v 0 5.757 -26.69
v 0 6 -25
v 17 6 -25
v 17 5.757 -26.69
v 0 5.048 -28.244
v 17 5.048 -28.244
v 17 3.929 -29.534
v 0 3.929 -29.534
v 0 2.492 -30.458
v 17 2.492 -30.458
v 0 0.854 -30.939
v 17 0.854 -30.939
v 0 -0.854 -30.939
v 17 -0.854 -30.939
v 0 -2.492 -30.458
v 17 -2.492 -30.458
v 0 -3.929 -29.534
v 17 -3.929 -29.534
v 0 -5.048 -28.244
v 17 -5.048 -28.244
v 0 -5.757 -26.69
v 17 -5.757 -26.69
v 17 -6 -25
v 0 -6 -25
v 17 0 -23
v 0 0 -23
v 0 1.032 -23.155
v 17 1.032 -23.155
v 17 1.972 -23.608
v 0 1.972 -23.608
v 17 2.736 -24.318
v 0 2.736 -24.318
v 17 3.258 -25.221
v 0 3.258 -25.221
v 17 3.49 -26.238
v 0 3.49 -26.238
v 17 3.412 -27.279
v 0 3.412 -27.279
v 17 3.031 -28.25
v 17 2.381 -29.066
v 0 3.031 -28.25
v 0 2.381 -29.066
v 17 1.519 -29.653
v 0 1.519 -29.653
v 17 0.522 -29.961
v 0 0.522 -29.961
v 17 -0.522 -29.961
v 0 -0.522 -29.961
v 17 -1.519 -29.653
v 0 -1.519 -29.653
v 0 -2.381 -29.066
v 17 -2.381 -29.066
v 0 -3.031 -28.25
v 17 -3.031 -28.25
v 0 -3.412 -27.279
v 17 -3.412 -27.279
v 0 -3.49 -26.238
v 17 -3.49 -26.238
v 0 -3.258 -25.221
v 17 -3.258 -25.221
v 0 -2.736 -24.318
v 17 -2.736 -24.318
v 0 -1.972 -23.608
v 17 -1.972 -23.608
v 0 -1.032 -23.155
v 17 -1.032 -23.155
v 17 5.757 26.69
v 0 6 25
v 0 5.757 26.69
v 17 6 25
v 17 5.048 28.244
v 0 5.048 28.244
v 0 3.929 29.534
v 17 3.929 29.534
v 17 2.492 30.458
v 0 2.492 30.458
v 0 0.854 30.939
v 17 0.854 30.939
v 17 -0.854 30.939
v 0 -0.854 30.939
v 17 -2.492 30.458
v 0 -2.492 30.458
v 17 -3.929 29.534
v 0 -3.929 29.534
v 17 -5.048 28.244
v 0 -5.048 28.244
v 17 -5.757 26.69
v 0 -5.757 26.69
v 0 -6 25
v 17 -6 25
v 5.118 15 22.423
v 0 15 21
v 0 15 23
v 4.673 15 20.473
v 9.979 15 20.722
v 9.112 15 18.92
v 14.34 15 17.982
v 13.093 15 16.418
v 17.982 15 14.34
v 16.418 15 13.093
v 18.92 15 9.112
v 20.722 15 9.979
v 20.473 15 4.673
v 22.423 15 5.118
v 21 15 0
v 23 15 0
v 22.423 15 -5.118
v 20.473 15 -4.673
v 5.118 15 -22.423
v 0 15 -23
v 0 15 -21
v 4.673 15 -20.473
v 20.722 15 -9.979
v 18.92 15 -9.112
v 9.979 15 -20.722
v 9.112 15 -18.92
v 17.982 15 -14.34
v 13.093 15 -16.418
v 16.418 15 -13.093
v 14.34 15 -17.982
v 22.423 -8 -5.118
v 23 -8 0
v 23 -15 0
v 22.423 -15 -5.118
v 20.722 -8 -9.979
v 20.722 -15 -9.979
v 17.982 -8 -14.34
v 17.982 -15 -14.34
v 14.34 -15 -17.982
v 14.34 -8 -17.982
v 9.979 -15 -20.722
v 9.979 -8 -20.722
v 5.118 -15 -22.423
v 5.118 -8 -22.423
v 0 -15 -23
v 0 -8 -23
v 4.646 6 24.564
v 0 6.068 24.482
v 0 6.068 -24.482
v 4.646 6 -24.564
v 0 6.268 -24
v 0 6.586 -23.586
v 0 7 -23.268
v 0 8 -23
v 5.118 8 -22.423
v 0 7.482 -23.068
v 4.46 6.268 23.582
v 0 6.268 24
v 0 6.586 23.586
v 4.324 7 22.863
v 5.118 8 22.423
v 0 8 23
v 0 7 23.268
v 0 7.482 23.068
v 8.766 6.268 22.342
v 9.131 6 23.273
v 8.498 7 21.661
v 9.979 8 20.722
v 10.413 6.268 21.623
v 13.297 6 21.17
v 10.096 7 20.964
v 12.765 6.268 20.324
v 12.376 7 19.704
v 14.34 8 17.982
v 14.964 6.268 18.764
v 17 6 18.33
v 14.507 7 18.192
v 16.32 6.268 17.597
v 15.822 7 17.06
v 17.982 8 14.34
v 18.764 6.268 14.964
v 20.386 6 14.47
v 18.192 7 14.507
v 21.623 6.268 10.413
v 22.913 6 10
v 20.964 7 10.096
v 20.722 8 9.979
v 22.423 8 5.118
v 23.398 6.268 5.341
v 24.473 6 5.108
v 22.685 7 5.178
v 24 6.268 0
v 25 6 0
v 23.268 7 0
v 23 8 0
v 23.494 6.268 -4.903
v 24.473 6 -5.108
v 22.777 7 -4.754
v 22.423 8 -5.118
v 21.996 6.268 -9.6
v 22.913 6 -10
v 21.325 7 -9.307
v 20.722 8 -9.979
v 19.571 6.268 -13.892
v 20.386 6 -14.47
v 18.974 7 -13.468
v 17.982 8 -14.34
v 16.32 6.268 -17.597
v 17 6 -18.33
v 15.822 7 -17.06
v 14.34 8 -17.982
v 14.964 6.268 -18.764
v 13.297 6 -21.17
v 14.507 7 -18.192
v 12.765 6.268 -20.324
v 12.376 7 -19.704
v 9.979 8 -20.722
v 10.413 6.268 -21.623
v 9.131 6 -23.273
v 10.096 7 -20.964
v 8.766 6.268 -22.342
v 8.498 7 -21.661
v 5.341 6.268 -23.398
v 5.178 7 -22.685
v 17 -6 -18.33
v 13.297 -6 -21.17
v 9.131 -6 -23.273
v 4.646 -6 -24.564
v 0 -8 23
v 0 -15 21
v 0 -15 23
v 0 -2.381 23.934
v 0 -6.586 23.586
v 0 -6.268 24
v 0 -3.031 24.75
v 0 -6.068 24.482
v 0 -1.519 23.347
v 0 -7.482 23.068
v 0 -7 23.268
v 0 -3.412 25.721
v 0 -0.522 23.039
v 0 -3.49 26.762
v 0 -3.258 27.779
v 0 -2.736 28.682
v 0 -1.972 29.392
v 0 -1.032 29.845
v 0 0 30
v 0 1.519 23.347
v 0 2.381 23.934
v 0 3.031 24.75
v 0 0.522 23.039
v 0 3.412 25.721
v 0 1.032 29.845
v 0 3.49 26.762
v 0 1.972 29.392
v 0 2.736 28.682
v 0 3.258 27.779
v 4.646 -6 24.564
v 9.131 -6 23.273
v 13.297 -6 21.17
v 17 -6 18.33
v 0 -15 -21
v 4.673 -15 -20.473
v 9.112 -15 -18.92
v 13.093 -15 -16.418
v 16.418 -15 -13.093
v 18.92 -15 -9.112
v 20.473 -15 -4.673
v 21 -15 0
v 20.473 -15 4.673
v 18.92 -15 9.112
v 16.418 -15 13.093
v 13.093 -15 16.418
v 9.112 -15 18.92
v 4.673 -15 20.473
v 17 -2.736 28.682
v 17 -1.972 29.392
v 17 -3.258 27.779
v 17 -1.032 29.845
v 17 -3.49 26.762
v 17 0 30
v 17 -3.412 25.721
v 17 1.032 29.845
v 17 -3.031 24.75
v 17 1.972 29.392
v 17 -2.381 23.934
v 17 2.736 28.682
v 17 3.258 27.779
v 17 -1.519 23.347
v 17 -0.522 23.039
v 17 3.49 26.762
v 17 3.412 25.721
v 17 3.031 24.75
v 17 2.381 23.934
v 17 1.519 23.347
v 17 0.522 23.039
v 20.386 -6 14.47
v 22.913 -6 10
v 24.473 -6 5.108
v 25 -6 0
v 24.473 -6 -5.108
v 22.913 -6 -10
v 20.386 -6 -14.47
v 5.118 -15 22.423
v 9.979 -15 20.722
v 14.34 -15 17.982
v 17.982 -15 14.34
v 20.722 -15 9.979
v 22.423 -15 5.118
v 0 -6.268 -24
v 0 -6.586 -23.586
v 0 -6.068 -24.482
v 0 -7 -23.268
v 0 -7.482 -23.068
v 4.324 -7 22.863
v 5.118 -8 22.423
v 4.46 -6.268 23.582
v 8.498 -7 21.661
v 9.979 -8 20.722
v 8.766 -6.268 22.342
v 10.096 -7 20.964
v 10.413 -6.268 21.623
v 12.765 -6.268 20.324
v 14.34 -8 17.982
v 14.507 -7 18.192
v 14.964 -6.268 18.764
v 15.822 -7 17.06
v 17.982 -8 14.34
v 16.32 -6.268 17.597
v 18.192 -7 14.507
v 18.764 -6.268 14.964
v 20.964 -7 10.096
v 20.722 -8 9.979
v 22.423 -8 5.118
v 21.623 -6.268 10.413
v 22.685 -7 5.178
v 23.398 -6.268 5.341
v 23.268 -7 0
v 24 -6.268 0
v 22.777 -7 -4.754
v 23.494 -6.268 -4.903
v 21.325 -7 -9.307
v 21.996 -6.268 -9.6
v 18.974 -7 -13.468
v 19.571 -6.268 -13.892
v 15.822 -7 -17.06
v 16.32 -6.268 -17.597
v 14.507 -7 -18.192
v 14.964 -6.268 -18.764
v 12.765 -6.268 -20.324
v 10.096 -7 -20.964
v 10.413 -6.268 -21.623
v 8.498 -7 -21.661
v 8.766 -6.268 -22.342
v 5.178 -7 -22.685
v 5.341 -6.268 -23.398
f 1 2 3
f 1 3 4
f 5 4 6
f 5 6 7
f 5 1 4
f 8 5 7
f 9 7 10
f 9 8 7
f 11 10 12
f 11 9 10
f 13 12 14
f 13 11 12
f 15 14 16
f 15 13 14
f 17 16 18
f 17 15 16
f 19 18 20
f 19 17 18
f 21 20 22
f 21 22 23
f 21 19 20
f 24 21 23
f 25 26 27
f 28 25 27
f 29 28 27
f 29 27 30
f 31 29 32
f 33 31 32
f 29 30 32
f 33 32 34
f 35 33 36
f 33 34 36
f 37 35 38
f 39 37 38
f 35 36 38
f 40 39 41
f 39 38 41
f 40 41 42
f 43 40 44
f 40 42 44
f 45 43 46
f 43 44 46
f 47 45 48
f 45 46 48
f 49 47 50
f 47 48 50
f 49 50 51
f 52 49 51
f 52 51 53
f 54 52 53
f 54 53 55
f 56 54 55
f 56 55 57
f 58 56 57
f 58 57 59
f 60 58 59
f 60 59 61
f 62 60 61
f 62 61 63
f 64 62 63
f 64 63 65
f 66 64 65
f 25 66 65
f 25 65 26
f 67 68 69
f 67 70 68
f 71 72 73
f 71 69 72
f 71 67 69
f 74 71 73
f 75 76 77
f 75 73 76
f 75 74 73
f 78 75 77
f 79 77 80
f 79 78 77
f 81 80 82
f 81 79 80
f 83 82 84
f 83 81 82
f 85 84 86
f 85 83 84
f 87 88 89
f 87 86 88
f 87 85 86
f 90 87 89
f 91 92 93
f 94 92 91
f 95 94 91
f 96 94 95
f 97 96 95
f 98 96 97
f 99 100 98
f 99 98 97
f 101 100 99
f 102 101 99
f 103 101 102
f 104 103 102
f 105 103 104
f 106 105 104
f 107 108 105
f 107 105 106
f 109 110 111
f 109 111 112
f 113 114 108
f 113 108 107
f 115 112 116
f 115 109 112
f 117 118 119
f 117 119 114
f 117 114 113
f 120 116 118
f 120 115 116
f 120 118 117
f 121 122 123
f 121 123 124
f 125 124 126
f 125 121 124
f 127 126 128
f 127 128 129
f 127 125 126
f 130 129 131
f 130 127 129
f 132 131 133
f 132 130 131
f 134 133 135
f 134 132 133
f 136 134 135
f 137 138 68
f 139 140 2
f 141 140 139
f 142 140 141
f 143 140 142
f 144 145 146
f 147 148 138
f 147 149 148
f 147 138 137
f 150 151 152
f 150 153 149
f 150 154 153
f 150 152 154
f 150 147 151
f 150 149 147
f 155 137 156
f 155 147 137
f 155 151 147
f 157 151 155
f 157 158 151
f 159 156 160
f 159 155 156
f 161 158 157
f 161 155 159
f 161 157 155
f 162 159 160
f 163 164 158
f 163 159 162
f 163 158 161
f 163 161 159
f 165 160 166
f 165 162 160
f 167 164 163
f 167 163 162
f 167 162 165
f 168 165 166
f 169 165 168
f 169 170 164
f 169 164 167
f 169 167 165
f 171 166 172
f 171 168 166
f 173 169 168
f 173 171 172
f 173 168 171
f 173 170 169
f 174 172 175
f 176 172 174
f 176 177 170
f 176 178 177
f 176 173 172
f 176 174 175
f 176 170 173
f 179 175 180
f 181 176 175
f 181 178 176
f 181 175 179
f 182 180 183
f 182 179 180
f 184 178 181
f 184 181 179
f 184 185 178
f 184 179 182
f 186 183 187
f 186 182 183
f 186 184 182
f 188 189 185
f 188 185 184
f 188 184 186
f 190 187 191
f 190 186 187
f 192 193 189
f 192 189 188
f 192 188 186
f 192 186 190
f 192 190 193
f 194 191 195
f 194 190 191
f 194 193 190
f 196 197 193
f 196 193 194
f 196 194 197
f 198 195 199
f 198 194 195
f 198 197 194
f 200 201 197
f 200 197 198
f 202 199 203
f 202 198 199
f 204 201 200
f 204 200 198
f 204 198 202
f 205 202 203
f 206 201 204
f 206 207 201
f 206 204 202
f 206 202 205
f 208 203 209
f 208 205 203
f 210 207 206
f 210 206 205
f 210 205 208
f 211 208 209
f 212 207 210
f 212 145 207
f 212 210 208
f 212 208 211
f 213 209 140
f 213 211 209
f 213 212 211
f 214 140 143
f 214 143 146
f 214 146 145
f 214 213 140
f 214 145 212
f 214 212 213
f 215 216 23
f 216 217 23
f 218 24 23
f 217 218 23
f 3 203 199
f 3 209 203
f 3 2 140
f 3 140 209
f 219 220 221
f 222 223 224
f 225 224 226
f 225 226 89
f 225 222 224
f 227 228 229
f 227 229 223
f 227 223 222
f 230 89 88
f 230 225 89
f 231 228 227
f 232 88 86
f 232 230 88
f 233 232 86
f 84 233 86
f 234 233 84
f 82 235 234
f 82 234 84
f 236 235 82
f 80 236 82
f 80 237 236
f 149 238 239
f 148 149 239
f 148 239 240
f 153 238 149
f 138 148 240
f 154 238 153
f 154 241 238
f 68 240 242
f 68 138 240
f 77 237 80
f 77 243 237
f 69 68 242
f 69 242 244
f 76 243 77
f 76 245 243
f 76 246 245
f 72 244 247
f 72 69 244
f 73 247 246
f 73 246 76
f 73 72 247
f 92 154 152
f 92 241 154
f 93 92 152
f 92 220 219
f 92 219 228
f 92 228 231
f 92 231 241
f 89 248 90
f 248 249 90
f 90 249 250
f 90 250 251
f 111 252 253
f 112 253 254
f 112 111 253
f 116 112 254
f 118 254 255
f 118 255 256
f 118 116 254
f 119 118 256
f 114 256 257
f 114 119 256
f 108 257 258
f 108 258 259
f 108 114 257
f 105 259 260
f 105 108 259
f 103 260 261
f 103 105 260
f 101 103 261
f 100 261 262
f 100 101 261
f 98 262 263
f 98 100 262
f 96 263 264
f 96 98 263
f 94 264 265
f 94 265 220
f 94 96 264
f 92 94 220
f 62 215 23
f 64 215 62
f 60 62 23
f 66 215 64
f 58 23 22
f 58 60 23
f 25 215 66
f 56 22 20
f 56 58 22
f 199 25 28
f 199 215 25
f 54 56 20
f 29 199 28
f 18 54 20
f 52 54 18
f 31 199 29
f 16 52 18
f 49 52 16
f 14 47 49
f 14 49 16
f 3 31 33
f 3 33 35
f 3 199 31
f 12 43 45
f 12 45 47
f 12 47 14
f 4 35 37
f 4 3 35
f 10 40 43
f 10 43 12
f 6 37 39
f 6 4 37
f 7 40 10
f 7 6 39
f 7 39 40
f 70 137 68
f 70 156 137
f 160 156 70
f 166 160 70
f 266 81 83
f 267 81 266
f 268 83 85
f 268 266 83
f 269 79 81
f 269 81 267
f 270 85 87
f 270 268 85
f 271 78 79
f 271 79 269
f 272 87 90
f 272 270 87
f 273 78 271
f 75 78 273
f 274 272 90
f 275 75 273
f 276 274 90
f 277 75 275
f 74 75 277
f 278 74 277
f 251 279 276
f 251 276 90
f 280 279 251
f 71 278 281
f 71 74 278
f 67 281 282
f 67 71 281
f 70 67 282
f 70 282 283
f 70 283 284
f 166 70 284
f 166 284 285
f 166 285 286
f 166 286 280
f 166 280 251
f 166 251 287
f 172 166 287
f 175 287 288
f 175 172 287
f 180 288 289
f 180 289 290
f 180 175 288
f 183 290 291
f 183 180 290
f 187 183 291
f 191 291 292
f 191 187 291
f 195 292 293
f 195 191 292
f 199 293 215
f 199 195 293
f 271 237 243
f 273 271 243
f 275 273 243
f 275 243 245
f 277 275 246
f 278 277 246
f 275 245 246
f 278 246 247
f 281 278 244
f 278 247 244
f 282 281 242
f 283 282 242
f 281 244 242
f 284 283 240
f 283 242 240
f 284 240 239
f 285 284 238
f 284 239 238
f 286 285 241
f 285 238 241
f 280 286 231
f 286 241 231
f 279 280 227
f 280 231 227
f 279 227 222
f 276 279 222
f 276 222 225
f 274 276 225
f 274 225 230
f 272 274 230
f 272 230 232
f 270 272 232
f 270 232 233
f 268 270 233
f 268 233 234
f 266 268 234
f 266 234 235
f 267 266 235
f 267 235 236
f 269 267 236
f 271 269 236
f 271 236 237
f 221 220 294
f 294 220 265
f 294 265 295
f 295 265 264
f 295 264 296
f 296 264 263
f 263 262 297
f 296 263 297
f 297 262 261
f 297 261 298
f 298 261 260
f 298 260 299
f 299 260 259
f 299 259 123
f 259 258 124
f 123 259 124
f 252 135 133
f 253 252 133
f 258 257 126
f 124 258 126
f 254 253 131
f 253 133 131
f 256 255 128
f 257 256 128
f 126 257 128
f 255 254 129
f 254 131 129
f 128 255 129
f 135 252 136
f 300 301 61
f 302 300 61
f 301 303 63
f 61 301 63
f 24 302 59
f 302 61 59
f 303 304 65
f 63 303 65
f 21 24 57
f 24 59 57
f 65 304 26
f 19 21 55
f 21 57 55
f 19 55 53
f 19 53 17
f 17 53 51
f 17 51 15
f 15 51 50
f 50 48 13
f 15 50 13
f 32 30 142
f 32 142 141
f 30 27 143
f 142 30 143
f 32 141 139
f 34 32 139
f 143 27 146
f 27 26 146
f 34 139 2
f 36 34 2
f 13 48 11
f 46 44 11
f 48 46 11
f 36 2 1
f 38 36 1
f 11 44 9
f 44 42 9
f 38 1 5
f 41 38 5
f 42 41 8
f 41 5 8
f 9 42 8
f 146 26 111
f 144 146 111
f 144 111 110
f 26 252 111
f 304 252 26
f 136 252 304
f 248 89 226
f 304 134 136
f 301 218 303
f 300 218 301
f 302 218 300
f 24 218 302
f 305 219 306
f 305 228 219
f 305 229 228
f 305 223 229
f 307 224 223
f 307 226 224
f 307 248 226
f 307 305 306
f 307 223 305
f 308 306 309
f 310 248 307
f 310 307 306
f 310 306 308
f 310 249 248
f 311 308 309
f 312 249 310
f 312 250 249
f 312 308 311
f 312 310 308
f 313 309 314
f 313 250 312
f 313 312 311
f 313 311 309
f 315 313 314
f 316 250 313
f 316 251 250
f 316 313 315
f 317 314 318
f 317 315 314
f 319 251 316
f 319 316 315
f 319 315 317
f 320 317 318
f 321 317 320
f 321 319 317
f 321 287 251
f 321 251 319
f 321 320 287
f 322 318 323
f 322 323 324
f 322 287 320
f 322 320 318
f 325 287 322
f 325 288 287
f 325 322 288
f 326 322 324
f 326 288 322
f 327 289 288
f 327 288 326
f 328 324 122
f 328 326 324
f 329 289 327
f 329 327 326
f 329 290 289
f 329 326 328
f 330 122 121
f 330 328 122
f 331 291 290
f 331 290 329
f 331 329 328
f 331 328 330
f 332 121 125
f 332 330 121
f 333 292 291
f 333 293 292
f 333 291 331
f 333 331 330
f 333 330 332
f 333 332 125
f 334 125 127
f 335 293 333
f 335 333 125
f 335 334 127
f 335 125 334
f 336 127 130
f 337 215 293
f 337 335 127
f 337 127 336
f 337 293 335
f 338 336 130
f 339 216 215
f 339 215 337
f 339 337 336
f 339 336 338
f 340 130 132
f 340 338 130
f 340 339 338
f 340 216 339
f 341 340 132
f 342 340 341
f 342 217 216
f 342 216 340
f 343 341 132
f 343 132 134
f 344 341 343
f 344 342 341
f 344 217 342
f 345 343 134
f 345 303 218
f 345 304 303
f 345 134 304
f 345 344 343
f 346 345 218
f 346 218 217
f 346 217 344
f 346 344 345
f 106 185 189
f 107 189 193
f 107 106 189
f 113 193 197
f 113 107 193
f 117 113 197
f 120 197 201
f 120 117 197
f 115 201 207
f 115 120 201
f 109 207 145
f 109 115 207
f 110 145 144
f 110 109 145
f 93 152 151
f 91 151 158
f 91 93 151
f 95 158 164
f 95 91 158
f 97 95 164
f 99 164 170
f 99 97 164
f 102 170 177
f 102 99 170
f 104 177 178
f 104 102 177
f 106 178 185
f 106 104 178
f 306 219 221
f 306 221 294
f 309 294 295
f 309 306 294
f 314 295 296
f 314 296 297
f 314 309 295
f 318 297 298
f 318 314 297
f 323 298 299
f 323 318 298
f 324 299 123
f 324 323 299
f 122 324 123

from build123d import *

# Parameters (mm, degrees)
BOSS_EXTRUDE1_DEPTH = 6
BOSS_EXTRUDE2_DEPTH = 15
FILLET1_RADIUS      = 6
FILLET1_LENGTH      = 17
FILLET2_RADIUS      = 6
FILLET2_LENGTH      = 17
FILLET3_ANGLE       = 180
SKETCH2_R           = 3.5
CUT_EXTRUDE1_DEPTH  = 43.555845662


with BuildPart() as part:
    # Sketch1 → Boss-Extrude1 (new, symmetric)
    with BuildSketch(Plane(origin=(0, 0, 0), x_dir=(1, 0, 0), z_dir=(0, 1, 0))):
        with BuildLine():
            Line((25, 0), (23, 0))
            ThreePointArc((23, 0), (16.263455967, -16.263455967), (0, -23))
            Line((0, -23), (0, -31))
            Line((0, -31), (17, -31))
            Line((17, -31), (17, -18.33030278))
            ThreePointArc((17, -18.33030278), (22.912878475, -10), (25, 0))
        make_face()
        with BuildLine():
            Line((0, 31), (0, 23))
            ThreePointArc((0, 23), (16.263455967, 16.263455967), (23, 0))
            Line((23, 0), (25, 0))
            ThreePointArc((25, 0), (22.912878475, 10), (17, 18.33030278))
            Line((17, 18.33030278), (17, 31))
            Line((17, 31), (0, 31))
        make_face()
    extrude(amount=BOSS_EXTRUDE1_DEPTH, both=True)

    # Sketch1<4> → Boss-Extrude2 (add, symmetric)
    with BuildSketch(Plane(origin=(0, 0, 0), x_dir=(1, 0, 0), z_dir=(0, 1, 0))):
        with BuildLine():
            Line((0, 23), (0, 21))
            ThreePointArc((0, 21), (14.849242405, 14.849242405), (21, 0))
            Line((21, 0), (23, 0))
            ThreePointArc((23, 0), (16.263455967, 16.263455967), (0, 23))
        make_face()
        with BuildLine():
            Line((23, 0), (21, 0))
            ThreePointArc((21, 0), (14.849242405, -14.849242405), (0, -21))
            Line((0, -21), (0, -23))
            ThreePointArc((0, -23), (16.263455967, -16.263455967), (23, 0))
        make_face()
    extrude(amount=BOSS_EXTRUDE2_DEPTH, both=True)

    # Fillet1: full round fillet: the end face becomes a half cylinder, R = half its width
    fillet1_face = Plane((8.5, 0, 31), x_dir=(1, 0, 0), z_dir=(0, 0, 1))  # on the end face: x along it, z out of the body
    fillet1_slab = fillet1_face.offset(-FILLET1_RADIUS / 2) * Box(FILLET1_LENGTH, 2 * FILLET1_RADIUS, FILLET1_RADIUS, mode=Mode.PRIVATE)  # the body's end, R deep
    fillet1_round = Plane((8.5, 0, 25), x_dir=(0, 0, 1), z_dir=(1, 0, 0)) * Cylinder(FILLET1_RADIUS, FILLET1_LENGTH, mode=Mode.PRIVATE)  # its axis R under the face
    add(fillet1_slab - fillet1_round, mode=Mode.SUBTRACT)

    # Fillet2: full round fillet: the end face becomes a half cylinder, R = half its width
    fillet2_face = Plane((8.5, 0, -31), x_dir=(-1, 0, 0), z_dir=(0, 0, -1))  # on the end face: x along it, z out of the body
    fillet2_slab = fillet2_face.offset(-FILLET2_RADIUS / 2) * Box(FILLET2_LENGTH, 2 * FILLET2_RADIUS, FILLET2_RADIUS, mode=Mode.PRIVATE)  # the body's end, R deep
    fillet2_round = Plane((8.5, 0, -25), x_dir=(0, 0, -1), z_dir=(-1, 0, 0)) * Cylinder(FILLET2_RADIUS, FILLET2_LENGTH, mode=Mode.PRIVATE)  # its axis R under the face
    add(fillet2_slab - fillet2_round, mode=Mode.SUBTRACT)

    # Fillet3: read off the stored shape, not the designer's step
    # Fillet3 outline → Fillet3 (revolve)
    with BuildSketch(Plane.ZY):
        with BuildLine():
            ThreePointArc((23, -8), (23.585786438, -6.585786438), (25, -6))
            Line((25, -6), (23, -6))
            Line((23, -6), (23, -8))
        make_face()
        with BuildLine():
            Line((23, 6), (25, 6))
            ThreePointArc((25, 6), (23.585786438, 6.585786438), (23, 8))
            Line((23, 8), (23, 6))
        make_face()
    revolve(axis=Axis((0, 0, 0), (0, 1, 0)), revolution_arc=FILLET3_ANGLE)

    # Sketch2 → Cut-Extrude1 (cut, through all)
    with BuildSketch(Plane.ZY):
        with Locations((-26.5, 0)):
            Circle(SKETCH2_R)
        with Locations((26.5, 0)):
            Circle(SKETCH2_R)
    extrude(amount=-CUT_EXTRUDE1_DEPTH, mode=Mode.SUBTRACT)


solid = part.part
